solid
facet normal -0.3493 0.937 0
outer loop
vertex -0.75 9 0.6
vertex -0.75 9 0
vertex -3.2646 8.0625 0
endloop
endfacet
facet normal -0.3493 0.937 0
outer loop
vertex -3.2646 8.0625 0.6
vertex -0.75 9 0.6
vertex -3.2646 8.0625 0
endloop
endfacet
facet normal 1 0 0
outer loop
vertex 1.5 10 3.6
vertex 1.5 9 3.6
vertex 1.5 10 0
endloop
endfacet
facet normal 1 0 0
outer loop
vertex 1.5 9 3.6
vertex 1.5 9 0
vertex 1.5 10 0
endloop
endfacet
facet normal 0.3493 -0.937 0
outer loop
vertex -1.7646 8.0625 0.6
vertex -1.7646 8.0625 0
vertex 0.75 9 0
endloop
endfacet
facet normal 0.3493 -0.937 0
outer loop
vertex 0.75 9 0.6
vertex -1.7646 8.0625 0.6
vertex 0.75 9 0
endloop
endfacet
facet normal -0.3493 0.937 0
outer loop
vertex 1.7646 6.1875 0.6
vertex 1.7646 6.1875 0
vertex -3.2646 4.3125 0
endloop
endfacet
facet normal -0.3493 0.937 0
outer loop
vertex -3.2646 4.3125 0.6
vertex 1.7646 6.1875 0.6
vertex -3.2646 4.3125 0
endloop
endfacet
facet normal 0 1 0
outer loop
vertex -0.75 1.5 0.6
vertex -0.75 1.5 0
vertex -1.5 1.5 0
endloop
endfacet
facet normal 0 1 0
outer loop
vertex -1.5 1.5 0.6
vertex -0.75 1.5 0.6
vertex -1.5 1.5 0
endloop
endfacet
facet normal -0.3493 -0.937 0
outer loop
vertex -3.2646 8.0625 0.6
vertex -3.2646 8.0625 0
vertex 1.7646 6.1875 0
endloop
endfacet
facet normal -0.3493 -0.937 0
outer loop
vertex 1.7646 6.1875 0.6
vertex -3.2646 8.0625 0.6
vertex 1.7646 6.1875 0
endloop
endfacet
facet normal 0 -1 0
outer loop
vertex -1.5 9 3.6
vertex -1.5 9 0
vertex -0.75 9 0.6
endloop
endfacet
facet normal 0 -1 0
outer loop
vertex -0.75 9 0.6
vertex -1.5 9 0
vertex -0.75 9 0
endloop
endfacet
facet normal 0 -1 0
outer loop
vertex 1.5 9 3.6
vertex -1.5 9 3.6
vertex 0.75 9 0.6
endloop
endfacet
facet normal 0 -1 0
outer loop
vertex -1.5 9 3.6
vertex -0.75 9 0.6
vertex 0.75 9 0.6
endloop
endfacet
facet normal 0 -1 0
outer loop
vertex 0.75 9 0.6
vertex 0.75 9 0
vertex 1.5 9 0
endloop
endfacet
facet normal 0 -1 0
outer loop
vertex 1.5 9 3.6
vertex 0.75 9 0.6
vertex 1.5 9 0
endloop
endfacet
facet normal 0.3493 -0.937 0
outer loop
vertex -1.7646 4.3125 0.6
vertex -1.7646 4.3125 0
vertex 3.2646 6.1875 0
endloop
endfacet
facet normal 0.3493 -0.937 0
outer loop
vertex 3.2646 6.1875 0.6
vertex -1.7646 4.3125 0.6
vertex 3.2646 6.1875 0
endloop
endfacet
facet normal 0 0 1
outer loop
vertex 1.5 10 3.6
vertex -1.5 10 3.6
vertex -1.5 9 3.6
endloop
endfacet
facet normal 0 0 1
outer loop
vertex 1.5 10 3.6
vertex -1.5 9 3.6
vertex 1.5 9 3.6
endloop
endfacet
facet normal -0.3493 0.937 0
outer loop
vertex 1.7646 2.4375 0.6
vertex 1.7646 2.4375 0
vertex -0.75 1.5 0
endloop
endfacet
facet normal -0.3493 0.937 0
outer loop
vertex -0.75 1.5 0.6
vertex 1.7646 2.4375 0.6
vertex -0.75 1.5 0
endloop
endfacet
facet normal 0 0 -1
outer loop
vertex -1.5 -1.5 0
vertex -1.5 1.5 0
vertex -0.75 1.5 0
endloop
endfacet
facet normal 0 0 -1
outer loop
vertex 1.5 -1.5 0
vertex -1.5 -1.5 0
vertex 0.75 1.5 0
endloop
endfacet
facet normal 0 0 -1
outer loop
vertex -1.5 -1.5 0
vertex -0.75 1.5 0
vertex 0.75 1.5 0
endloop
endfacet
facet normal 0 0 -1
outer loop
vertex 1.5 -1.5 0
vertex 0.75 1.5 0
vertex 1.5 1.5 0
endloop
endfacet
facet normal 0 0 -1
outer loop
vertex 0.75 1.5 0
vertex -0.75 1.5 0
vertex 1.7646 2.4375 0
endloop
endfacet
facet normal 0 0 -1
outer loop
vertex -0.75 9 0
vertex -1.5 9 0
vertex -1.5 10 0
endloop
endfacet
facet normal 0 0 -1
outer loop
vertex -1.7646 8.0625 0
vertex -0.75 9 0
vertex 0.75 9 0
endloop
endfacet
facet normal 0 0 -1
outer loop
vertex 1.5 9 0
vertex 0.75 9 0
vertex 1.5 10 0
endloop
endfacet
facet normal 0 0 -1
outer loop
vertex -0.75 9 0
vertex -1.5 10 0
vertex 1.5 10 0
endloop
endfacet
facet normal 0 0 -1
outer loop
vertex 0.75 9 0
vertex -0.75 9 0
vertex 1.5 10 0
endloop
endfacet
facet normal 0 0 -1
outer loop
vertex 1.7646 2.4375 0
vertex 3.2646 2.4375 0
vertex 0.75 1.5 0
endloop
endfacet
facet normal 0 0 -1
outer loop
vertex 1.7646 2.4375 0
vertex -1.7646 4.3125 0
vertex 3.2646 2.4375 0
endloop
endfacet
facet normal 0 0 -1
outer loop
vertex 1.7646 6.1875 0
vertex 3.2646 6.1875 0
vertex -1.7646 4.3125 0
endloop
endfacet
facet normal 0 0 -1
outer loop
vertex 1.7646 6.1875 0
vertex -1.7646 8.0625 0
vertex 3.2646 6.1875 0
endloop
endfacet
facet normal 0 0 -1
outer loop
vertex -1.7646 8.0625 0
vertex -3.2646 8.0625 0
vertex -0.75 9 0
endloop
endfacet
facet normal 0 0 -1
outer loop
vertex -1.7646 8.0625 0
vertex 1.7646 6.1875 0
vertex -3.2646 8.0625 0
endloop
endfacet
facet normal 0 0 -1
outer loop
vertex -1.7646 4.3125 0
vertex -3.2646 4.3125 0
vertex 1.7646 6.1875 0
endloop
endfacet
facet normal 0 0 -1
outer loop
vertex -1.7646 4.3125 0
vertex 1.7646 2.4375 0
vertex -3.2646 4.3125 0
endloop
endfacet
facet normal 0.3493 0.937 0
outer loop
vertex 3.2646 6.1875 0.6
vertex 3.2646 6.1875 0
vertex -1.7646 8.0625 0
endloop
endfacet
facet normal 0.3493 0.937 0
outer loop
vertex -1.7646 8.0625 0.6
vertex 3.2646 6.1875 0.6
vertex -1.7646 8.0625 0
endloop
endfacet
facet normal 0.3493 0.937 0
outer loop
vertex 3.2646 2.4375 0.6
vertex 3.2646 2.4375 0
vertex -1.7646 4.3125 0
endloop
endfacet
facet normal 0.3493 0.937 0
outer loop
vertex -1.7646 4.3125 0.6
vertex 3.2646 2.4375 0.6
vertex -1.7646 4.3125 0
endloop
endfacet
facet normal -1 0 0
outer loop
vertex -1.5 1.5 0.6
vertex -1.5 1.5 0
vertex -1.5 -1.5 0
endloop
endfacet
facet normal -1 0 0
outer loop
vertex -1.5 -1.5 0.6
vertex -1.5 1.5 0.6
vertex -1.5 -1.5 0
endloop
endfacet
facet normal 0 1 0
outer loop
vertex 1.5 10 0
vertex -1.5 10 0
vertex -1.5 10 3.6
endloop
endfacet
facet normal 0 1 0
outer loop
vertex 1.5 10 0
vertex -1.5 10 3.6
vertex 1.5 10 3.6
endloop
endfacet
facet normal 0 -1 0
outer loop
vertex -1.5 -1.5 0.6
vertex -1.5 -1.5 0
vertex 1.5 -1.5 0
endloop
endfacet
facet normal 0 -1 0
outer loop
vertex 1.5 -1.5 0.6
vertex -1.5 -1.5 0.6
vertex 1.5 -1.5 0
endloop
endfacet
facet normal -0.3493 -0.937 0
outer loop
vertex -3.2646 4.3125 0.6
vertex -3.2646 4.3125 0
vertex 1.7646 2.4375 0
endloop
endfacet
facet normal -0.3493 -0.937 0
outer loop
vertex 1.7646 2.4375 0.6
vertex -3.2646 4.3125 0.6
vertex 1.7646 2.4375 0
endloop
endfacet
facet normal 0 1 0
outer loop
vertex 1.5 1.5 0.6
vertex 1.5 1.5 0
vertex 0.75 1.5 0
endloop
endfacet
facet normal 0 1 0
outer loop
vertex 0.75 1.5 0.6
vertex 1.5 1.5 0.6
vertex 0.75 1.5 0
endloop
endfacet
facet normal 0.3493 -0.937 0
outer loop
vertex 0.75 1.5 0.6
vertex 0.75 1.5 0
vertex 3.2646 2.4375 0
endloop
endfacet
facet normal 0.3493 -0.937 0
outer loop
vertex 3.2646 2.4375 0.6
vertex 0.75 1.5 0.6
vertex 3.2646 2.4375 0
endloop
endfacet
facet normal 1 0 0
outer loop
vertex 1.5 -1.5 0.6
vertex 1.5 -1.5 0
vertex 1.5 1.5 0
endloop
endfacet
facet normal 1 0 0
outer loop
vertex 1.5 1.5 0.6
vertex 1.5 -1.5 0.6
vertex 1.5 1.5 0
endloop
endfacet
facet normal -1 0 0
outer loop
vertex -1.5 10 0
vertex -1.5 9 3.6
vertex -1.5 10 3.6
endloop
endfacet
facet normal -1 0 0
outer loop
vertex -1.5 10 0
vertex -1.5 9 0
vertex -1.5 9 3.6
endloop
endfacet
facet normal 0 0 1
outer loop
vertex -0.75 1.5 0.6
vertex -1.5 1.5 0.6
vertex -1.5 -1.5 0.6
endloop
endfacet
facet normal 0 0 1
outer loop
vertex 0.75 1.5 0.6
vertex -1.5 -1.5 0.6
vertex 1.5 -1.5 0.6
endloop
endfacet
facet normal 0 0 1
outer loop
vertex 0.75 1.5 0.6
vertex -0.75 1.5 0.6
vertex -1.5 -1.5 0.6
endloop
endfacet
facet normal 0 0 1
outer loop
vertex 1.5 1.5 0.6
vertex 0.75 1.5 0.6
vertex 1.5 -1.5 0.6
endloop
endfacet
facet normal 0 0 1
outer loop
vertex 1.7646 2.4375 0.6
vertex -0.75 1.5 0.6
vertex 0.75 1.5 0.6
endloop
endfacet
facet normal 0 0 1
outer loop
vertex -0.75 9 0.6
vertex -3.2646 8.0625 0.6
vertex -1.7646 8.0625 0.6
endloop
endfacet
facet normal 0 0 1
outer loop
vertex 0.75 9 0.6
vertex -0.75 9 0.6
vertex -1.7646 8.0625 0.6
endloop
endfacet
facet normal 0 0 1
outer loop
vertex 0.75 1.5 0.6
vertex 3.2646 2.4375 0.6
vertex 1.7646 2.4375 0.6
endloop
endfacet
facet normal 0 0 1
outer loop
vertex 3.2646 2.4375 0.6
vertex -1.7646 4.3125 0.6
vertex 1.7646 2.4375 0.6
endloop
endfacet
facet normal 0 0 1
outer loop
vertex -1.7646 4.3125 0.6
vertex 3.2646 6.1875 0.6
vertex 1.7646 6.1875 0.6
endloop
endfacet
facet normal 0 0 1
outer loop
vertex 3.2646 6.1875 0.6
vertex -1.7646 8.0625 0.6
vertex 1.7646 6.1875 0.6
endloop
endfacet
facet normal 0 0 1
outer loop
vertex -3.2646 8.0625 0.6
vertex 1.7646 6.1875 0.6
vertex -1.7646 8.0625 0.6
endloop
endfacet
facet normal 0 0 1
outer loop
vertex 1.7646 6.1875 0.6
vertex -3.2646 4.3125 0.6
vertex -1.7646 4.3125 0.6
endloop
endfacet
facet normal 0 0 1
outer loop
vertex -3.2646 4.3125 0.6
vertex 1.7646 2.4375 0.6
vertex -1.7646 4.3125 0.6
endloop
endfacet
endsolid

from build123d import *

# Parameters (mm, degrees)
PAD_DEPTH    = 0.6
SKETCH001_W  = 3
SKETCH001_H  = 1
PAD001_DEPTH = 3


with BuildPart() as part:
    # Sketch → Pad (new body)
    with BuildSketch(Plane.XY):
        Polygon((-0.75, 1.5), (-1.5, 1.5), (-1.5, -1.5), (1.5, -1.5), (1.5, 1.5), (0.75, 1.5), (3.264603, 2.4375), (-1.764603, 4.3125), (3.264603, 6.1875), (-1.764603, 8.0625), (0.75, 9), (1.5, 9), (1.5, 10), (-1.5, 10), (-1.5, 9), (-0.75, 9), (-3.264603, 8.0625), (1.764603, 6.1875), (-3.264603, 4.3125), (1.764603, 2.4375), align=None)
    extrude(amount=PAD_DEPTH)

    # Sketch001 → Pad001 (new body)
    with BuildSketch(Plane.XY.offset(0.6)):
        with Locations((0, 9.5)):
            Rectangle(SKETCH001_W, SKETCH001_H)
    extrude(amount=PAD001_DEPTH)


solid = part.part
